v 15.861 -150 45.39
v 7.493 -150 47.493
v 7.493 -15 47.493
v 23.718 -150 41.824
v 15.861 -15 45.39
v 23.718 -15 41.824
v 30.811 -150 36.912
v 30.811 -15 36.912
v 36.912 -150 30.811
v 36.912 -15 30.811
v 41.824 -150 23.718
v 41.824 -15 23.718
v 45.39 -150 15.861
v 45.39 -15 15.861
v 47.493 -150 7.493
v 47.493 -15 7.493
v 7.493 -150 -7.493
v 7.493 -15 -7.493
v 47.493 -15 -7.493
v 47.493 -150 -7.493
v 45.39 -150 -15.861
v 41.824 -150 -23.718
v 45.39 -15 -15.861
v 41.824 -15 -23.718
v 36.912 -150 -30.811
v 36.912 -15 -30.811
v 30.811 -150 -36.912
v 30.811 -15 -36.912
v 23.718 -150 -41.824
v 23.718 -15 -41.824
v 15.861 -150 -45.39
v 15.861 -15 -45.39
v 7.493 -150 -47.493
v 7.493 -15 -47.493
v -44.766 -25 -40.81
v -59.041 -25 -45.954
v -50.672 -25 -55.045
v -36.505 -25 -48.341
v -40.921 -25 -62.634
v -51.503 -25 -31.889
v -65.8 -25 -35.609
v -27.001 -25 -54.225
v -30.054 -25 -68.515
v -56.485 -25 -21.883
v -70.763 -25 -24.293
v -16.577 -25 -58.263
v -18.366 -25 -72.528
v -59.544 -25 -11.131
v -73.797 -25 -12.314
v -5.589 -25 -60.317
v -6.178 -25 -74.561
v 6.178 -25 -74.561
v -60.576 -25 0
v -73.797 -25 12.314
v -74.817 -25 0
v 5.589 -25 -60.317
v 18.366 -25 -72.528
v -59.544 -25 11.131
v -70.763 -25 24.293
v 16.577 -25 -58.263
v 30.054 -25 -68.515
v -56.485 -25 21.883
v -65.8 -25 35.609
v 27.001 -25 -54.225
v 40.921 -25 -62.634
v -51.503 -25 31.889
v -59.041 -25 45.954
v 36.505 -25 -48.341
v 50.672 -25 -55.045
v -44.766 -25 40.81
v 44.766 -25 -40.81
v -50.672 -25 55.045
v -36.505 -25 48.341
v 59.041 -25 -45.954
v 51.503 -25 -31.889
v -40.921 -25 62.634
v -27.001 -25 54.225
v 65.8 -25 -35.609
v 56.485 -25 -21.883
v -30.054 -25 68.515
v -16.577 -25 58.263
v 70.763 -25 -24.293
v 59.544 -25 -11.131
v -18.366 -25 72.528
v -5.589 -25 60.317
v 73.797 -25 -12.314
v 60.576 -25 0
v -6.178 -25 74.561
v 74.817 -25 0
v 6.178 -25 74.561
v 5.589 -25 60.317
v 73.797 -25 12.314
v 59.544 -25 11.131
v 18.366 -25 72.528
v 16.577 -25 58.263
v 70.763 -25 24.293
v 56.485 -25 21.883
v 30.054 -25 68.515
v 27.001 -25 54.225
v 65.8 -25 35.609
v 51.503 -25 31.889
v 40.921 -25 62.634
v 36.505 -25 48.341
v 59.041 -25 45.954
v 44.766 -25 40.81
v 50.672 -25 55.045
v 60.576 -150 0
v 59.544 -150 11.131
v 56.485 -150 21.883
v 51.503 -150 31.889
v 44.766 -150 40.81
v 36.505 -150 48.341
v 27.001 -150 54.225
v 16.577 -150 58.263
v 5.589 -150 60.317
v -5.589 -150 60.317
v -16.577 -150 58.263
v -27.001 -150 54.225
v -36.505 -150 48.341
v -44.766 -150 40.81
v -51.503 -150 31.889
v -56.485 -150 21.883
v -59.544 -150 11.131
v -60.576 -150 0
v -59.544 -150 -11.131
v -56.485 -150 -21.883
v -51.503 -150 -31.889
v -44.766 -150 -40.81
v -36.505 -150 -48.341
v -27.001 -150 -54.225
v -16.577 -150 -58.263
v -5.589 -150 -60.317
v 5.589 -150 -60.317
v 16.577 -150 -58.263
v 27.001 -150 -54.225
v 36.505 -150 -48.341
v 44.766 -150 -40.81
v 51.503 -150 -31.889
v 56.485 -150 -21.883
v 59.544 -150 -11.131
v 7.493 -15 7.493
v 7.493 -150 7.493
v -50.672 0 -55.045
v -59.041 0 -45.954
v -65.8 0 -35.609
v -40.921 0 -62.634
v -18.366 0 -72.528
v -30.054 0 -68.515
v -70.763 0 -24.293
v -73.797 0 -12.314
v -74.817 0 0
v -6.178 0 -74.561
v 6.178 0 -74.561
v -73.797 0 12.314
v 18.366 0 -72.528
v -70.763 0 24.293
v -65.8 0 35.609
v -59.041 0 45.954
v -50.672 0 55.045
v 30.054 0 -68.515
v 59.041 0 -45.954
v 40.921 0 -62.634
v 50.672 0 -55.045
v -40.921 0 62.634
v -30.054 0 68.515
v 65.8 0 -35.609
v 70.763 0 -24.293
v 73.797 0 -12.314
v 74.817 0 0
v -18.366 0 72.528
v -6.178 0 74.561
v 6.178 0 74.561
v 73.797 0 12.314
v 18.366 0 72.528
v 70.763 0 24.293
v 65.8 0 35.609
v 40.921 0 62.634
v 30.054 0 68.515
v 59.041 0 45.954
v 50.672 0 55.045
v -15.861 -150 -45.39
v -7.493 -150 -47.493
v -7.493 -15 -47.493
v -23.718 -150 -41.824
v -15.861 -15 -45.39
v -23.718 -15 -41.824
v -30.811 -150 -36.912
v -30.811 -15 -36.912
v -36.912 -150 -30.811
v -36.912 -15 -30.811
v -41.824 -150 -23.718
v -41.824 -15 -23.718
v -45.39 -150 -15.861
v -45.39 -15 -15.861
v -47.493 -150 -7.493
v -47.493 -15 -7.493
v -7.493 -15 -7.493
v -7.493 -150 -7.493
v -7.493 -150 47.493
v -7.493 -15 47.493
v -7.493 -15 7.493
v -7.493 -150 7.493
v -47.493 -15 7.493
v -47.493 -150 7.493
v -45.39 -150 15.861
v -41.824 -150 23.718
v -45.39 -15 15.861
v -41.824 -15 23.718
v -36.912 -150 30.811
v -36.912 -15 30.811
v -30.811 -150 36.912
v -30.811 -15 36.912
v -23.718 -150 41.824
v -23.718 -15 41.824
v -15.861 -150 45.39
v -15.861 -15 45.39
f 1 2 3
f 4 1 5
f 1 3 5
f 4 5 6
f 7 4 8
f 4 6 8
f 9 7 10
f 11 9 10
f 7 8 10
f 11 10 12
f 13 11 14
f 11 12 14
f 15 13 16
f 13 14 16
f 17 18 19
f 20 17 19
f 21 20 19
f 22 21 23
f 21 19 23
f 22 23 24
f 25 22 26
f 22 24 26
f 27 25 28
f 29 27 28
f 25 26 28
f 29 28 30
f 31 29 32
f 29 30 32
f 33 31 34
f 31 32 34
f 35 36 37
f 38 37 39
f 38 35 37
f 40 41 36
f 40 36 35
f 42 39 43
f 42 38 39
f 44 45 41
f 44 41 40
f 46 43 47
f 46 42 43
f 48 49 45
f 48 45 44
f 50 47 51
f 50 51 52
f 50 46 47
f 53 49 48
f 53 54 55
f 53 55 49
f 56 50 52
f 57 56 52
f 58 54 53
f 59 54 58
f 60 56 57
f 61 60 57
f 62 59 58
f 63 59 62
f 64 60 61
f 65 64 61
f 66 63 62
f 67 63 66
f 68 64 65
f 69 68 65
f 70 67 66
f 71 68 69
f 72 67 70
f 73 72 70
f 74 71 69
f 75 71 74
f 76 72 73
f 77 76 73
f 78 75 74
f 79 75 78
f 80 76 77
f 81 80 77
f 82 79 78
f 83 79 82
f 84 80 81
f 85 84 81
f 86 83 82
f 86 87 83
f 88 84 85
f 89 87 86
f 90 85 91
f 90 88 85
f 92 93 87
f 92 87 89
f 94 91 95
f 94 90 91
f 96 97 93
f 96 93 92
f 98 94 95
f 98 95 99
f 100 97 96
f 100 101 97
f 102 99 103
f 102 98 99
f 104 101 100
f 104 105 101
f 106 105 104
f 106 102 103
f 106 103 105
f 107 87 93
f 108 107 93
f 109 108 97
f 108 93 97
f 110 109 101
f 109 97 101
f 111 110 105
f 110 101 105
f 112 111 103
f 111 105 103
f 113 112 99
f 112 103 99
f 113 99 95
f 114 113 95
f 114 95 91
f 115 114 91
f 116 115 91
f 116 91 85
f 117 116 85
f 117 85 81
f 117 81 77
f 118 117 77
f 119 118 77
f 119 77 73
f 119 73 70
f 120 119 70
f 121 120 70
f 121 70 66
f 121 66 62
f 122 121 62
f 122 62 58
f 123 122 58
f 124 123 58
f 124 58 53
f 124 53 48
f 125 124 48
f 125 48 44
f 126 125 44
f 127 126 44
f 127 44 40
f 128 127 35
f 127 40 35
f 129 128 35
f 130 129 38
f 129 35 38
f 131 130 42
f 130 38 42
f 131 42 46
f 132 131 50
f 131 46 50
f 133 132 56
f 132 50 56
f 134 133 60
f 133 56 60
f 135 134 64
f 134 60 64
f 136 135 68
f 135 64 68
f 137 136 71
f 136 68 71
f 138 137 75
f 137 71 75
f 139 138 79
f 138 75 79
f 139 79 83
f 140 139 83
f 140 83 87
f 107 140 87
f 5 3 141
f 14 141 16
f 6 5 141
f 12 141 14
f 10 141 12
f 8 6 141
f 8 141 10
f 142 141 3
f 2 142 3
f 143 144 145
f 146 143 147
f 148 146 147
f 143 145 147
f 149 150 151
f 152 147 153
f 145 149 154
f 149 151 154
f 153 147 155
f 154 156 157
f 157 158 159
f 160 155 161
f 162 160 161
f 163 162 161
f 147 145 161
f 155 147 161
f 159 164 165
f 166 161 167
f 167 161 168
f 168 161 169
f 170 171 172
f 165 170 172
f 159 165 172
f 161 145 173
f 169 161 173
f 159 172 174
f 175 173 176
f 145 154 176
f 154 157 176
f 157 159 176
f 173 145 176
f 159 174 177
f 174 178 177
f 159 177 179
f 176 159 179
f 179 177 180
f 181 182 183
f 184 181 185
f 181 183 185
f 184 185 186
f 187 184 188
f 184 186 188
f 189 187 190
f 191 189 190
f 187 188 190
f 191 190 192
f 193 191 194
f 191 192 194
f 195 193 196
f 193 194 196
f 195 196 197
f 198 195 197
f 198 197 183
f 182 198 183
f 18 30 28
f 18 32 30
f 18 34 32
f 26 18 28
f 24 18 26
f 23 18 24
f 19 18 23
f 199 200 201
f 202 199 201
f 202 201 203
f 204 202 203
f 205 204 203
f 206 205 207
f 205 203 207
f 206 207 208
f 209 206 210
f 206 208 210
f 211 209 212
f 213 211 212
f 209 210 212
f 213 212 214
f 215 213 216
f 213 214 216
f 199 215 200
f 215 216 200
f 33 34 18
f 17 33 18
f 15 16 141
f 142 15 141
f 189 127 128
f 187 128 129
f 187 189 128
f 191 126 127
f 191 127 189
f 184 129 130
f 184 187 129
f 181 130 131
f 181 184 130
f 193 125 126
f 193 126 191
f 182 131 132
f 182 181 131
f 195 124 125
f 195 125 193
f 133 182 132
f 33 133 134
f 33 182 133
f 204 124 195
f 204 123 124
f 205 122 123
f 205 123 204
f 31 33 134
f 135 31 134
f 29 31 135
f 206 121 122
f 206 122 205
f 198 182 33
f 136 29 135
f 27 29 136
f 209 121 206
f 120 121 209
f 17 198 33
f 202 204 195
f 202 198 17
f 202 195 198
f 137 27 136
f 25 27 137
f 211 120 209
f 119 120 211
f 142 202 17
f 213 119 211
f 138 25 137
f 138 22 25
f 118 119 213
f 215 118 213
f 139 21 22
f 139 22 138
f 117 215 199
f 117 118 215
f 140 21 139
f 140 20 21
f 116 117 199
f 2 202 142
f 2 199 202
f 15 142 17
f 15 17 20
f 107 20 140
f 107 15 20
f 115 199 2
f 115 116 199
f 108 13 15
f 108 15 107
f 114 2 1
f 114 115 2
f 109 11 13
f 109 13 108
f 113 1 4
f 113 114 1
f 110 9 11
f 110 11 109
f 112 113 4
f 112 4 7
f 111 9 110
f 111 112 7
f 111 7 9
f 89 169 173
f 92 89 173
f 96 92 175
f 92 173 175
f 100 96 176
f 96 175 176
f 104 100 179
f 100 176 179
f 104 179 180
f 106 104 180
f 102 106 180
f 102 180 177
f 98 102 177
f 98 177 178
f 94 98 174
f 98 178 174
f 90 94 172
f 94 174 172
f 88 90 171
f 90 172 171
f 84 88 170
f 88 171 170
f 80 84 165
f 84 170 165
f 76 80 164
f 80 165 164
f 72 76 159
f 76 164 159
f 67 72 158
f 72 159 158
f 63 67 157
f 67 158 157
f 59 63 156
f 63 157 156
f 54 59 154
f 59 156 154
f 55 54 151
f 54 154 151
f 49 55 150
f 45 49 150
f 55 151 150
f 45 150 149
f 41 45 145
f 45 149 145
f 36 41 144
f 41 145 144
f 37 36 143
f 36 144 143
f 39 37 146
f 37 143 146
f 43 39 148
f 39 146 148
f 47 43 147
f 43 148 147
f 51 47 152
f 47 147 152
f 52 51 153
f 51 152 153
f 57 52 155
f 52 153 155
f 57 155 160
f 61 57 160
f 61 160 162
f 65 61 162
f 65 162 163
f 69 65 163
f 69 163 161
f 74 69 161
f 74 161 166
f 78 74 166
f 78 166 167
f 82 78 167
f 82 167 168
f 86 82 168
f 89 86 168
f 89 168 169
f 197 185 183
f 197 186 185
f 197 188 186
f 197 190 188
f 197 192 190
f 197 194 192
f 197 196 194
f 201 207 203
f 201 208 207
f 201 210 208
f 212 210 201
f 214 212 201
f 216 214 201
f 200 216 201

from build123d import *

# Parameters (mm, degrees)
F0_R     = 60.575809744
F0_R_2   = 51.7071854394
F0_R_3   = 49.5795397822
F1_DEPTH = 150
F2_R     = 74.8170316814
F3_DEPTH = 25
F4_DEPTH = 10


with BuildPart() as f1:
    # F0 (on Front) → F1 (new body)
    with BuildSketch(Plane.XZ):
        Circle(F0_R)
        Circle(F0_R_2, mode=Mode.SUBTRACT)
        Circle(F0_R_2)
        Circle(F0_R_3, mode=Mode.SUBTRACT)
        Circle(F0_R_3)
        with BuildLine():
            ThreePointArc((47.4934404762, 7.4934404762), (47.9338537115, 3.7582185677), (48.0809581689, 0))
            ThreePointArc((48.0809581689, 0), (47.9338537115, -3.7582185677), (47.4934404762, -7.4934404762))
            ThreePointArc((47.4934404762, -7.4934404762), (33.9983715672, -33.9983715672), (7.4934404762, -47.4934404762))
            ThreePointArc((7.4934404762, -47.4934404762), (0, -48.0809581689), (-7.4934404762, -47.4934404762))
            ThreePointArc((-7.4934404762, -47.4934404762), (-33.9983715672, -33.9983715672), (-47.4934404762, -7.4934404762))
            ThreePointArc((-47.4934404762, -7.4934404762), (-48.0809581689, 0), (-47.4934404762, 7.4934404762))
            ThreePointArc((-47.4934404762, 7.4934404762), (-33.9983715672, 33.9983715672), (-7.4934404762, 47.4934404762))
            ThreePointArc((-7.4934404762, 47.4934404762), (0, 48.0809581689), (7.4934404762, 47.4934404762))
            ThreePointArc((7.4934404762, 47.4934404762), (33.9983715672, 33.9983715672), (47.4934404762, 7.4934404762))
        make_face(mode=Mode.SUBTRACT)
        with BuildLine():
            ThreePointArc((47.4934404762, -7.4934404762), (47.9338537115, -3.7582185677), (48.0809581689, 0))
            ThreePointArc((48.0809581689, 0), (47.9338537115, 3.7582185677), (47.4934404762, 7.4934404762))
            Line((47.4934404762, 7.4934404762), (7.4934404762, 7.4934404762))
            Line((7.4934404762, 7.4934404762), (7.4934404762, 47.4934404762))
            ThreePointArc((7.4934404762, 47.4934404762), (0, 48.0809581689), (-7.4934404762, 47.4934404762))
            Line((-7.4934404762, 47.4934404762), (-7.4934404762, 7.4934404762))
            Line((-7.4934404762, 7.4934404762), (-47.4934404762, 7.4934404762))
            ThreePointArc((-47.4934404762, 7.4934404762), (-48.0809581689, 0), (-47.4934404762, -7.4934404762))
            Line((-47.4934404762, -7.4934404762), (-7.4934404762, -7.4934404762))
            Line((-7.4934404762, -7.4934404762), (-7.4934404762, -47.4934404762))
            ThreePointArc((-7.4934404762, -47.4934404762), (0, -48.0809581689), (7.4934404762, -47.4934404762))
            Line((7.4934404762, -47.4934404762), (7.4934404762, -7.4934404762))
            Line((7.4934404762, -7.4934404762), (47.4934404762, -7.4934404762))
        make_face()
    extrude(amount=F1_DEPTH)

    # F2 (on Front) → F3 (join)
    with BuildSketch(Plane.XZ):
        Circle(F2_R)
    extrude(amount=F3_DEPTH)

    # F4 (cut): faces of the model
    f4_faces = [f1.faces().sort_by_distance(p)[0] for p in [
        (-23.6778496661, -25, 23.6778496661),
        (23.6778496661, -25, 23.6778496661),
        (23.6778496661, -25, -23.6778496661),
        (-23.6778496661, -25, -23.6778496661),
    ]]
    extrude(f4_faces, amount=-F4_DEPTH, mode=Mode.SUBTRACT)


solid = f1.part
